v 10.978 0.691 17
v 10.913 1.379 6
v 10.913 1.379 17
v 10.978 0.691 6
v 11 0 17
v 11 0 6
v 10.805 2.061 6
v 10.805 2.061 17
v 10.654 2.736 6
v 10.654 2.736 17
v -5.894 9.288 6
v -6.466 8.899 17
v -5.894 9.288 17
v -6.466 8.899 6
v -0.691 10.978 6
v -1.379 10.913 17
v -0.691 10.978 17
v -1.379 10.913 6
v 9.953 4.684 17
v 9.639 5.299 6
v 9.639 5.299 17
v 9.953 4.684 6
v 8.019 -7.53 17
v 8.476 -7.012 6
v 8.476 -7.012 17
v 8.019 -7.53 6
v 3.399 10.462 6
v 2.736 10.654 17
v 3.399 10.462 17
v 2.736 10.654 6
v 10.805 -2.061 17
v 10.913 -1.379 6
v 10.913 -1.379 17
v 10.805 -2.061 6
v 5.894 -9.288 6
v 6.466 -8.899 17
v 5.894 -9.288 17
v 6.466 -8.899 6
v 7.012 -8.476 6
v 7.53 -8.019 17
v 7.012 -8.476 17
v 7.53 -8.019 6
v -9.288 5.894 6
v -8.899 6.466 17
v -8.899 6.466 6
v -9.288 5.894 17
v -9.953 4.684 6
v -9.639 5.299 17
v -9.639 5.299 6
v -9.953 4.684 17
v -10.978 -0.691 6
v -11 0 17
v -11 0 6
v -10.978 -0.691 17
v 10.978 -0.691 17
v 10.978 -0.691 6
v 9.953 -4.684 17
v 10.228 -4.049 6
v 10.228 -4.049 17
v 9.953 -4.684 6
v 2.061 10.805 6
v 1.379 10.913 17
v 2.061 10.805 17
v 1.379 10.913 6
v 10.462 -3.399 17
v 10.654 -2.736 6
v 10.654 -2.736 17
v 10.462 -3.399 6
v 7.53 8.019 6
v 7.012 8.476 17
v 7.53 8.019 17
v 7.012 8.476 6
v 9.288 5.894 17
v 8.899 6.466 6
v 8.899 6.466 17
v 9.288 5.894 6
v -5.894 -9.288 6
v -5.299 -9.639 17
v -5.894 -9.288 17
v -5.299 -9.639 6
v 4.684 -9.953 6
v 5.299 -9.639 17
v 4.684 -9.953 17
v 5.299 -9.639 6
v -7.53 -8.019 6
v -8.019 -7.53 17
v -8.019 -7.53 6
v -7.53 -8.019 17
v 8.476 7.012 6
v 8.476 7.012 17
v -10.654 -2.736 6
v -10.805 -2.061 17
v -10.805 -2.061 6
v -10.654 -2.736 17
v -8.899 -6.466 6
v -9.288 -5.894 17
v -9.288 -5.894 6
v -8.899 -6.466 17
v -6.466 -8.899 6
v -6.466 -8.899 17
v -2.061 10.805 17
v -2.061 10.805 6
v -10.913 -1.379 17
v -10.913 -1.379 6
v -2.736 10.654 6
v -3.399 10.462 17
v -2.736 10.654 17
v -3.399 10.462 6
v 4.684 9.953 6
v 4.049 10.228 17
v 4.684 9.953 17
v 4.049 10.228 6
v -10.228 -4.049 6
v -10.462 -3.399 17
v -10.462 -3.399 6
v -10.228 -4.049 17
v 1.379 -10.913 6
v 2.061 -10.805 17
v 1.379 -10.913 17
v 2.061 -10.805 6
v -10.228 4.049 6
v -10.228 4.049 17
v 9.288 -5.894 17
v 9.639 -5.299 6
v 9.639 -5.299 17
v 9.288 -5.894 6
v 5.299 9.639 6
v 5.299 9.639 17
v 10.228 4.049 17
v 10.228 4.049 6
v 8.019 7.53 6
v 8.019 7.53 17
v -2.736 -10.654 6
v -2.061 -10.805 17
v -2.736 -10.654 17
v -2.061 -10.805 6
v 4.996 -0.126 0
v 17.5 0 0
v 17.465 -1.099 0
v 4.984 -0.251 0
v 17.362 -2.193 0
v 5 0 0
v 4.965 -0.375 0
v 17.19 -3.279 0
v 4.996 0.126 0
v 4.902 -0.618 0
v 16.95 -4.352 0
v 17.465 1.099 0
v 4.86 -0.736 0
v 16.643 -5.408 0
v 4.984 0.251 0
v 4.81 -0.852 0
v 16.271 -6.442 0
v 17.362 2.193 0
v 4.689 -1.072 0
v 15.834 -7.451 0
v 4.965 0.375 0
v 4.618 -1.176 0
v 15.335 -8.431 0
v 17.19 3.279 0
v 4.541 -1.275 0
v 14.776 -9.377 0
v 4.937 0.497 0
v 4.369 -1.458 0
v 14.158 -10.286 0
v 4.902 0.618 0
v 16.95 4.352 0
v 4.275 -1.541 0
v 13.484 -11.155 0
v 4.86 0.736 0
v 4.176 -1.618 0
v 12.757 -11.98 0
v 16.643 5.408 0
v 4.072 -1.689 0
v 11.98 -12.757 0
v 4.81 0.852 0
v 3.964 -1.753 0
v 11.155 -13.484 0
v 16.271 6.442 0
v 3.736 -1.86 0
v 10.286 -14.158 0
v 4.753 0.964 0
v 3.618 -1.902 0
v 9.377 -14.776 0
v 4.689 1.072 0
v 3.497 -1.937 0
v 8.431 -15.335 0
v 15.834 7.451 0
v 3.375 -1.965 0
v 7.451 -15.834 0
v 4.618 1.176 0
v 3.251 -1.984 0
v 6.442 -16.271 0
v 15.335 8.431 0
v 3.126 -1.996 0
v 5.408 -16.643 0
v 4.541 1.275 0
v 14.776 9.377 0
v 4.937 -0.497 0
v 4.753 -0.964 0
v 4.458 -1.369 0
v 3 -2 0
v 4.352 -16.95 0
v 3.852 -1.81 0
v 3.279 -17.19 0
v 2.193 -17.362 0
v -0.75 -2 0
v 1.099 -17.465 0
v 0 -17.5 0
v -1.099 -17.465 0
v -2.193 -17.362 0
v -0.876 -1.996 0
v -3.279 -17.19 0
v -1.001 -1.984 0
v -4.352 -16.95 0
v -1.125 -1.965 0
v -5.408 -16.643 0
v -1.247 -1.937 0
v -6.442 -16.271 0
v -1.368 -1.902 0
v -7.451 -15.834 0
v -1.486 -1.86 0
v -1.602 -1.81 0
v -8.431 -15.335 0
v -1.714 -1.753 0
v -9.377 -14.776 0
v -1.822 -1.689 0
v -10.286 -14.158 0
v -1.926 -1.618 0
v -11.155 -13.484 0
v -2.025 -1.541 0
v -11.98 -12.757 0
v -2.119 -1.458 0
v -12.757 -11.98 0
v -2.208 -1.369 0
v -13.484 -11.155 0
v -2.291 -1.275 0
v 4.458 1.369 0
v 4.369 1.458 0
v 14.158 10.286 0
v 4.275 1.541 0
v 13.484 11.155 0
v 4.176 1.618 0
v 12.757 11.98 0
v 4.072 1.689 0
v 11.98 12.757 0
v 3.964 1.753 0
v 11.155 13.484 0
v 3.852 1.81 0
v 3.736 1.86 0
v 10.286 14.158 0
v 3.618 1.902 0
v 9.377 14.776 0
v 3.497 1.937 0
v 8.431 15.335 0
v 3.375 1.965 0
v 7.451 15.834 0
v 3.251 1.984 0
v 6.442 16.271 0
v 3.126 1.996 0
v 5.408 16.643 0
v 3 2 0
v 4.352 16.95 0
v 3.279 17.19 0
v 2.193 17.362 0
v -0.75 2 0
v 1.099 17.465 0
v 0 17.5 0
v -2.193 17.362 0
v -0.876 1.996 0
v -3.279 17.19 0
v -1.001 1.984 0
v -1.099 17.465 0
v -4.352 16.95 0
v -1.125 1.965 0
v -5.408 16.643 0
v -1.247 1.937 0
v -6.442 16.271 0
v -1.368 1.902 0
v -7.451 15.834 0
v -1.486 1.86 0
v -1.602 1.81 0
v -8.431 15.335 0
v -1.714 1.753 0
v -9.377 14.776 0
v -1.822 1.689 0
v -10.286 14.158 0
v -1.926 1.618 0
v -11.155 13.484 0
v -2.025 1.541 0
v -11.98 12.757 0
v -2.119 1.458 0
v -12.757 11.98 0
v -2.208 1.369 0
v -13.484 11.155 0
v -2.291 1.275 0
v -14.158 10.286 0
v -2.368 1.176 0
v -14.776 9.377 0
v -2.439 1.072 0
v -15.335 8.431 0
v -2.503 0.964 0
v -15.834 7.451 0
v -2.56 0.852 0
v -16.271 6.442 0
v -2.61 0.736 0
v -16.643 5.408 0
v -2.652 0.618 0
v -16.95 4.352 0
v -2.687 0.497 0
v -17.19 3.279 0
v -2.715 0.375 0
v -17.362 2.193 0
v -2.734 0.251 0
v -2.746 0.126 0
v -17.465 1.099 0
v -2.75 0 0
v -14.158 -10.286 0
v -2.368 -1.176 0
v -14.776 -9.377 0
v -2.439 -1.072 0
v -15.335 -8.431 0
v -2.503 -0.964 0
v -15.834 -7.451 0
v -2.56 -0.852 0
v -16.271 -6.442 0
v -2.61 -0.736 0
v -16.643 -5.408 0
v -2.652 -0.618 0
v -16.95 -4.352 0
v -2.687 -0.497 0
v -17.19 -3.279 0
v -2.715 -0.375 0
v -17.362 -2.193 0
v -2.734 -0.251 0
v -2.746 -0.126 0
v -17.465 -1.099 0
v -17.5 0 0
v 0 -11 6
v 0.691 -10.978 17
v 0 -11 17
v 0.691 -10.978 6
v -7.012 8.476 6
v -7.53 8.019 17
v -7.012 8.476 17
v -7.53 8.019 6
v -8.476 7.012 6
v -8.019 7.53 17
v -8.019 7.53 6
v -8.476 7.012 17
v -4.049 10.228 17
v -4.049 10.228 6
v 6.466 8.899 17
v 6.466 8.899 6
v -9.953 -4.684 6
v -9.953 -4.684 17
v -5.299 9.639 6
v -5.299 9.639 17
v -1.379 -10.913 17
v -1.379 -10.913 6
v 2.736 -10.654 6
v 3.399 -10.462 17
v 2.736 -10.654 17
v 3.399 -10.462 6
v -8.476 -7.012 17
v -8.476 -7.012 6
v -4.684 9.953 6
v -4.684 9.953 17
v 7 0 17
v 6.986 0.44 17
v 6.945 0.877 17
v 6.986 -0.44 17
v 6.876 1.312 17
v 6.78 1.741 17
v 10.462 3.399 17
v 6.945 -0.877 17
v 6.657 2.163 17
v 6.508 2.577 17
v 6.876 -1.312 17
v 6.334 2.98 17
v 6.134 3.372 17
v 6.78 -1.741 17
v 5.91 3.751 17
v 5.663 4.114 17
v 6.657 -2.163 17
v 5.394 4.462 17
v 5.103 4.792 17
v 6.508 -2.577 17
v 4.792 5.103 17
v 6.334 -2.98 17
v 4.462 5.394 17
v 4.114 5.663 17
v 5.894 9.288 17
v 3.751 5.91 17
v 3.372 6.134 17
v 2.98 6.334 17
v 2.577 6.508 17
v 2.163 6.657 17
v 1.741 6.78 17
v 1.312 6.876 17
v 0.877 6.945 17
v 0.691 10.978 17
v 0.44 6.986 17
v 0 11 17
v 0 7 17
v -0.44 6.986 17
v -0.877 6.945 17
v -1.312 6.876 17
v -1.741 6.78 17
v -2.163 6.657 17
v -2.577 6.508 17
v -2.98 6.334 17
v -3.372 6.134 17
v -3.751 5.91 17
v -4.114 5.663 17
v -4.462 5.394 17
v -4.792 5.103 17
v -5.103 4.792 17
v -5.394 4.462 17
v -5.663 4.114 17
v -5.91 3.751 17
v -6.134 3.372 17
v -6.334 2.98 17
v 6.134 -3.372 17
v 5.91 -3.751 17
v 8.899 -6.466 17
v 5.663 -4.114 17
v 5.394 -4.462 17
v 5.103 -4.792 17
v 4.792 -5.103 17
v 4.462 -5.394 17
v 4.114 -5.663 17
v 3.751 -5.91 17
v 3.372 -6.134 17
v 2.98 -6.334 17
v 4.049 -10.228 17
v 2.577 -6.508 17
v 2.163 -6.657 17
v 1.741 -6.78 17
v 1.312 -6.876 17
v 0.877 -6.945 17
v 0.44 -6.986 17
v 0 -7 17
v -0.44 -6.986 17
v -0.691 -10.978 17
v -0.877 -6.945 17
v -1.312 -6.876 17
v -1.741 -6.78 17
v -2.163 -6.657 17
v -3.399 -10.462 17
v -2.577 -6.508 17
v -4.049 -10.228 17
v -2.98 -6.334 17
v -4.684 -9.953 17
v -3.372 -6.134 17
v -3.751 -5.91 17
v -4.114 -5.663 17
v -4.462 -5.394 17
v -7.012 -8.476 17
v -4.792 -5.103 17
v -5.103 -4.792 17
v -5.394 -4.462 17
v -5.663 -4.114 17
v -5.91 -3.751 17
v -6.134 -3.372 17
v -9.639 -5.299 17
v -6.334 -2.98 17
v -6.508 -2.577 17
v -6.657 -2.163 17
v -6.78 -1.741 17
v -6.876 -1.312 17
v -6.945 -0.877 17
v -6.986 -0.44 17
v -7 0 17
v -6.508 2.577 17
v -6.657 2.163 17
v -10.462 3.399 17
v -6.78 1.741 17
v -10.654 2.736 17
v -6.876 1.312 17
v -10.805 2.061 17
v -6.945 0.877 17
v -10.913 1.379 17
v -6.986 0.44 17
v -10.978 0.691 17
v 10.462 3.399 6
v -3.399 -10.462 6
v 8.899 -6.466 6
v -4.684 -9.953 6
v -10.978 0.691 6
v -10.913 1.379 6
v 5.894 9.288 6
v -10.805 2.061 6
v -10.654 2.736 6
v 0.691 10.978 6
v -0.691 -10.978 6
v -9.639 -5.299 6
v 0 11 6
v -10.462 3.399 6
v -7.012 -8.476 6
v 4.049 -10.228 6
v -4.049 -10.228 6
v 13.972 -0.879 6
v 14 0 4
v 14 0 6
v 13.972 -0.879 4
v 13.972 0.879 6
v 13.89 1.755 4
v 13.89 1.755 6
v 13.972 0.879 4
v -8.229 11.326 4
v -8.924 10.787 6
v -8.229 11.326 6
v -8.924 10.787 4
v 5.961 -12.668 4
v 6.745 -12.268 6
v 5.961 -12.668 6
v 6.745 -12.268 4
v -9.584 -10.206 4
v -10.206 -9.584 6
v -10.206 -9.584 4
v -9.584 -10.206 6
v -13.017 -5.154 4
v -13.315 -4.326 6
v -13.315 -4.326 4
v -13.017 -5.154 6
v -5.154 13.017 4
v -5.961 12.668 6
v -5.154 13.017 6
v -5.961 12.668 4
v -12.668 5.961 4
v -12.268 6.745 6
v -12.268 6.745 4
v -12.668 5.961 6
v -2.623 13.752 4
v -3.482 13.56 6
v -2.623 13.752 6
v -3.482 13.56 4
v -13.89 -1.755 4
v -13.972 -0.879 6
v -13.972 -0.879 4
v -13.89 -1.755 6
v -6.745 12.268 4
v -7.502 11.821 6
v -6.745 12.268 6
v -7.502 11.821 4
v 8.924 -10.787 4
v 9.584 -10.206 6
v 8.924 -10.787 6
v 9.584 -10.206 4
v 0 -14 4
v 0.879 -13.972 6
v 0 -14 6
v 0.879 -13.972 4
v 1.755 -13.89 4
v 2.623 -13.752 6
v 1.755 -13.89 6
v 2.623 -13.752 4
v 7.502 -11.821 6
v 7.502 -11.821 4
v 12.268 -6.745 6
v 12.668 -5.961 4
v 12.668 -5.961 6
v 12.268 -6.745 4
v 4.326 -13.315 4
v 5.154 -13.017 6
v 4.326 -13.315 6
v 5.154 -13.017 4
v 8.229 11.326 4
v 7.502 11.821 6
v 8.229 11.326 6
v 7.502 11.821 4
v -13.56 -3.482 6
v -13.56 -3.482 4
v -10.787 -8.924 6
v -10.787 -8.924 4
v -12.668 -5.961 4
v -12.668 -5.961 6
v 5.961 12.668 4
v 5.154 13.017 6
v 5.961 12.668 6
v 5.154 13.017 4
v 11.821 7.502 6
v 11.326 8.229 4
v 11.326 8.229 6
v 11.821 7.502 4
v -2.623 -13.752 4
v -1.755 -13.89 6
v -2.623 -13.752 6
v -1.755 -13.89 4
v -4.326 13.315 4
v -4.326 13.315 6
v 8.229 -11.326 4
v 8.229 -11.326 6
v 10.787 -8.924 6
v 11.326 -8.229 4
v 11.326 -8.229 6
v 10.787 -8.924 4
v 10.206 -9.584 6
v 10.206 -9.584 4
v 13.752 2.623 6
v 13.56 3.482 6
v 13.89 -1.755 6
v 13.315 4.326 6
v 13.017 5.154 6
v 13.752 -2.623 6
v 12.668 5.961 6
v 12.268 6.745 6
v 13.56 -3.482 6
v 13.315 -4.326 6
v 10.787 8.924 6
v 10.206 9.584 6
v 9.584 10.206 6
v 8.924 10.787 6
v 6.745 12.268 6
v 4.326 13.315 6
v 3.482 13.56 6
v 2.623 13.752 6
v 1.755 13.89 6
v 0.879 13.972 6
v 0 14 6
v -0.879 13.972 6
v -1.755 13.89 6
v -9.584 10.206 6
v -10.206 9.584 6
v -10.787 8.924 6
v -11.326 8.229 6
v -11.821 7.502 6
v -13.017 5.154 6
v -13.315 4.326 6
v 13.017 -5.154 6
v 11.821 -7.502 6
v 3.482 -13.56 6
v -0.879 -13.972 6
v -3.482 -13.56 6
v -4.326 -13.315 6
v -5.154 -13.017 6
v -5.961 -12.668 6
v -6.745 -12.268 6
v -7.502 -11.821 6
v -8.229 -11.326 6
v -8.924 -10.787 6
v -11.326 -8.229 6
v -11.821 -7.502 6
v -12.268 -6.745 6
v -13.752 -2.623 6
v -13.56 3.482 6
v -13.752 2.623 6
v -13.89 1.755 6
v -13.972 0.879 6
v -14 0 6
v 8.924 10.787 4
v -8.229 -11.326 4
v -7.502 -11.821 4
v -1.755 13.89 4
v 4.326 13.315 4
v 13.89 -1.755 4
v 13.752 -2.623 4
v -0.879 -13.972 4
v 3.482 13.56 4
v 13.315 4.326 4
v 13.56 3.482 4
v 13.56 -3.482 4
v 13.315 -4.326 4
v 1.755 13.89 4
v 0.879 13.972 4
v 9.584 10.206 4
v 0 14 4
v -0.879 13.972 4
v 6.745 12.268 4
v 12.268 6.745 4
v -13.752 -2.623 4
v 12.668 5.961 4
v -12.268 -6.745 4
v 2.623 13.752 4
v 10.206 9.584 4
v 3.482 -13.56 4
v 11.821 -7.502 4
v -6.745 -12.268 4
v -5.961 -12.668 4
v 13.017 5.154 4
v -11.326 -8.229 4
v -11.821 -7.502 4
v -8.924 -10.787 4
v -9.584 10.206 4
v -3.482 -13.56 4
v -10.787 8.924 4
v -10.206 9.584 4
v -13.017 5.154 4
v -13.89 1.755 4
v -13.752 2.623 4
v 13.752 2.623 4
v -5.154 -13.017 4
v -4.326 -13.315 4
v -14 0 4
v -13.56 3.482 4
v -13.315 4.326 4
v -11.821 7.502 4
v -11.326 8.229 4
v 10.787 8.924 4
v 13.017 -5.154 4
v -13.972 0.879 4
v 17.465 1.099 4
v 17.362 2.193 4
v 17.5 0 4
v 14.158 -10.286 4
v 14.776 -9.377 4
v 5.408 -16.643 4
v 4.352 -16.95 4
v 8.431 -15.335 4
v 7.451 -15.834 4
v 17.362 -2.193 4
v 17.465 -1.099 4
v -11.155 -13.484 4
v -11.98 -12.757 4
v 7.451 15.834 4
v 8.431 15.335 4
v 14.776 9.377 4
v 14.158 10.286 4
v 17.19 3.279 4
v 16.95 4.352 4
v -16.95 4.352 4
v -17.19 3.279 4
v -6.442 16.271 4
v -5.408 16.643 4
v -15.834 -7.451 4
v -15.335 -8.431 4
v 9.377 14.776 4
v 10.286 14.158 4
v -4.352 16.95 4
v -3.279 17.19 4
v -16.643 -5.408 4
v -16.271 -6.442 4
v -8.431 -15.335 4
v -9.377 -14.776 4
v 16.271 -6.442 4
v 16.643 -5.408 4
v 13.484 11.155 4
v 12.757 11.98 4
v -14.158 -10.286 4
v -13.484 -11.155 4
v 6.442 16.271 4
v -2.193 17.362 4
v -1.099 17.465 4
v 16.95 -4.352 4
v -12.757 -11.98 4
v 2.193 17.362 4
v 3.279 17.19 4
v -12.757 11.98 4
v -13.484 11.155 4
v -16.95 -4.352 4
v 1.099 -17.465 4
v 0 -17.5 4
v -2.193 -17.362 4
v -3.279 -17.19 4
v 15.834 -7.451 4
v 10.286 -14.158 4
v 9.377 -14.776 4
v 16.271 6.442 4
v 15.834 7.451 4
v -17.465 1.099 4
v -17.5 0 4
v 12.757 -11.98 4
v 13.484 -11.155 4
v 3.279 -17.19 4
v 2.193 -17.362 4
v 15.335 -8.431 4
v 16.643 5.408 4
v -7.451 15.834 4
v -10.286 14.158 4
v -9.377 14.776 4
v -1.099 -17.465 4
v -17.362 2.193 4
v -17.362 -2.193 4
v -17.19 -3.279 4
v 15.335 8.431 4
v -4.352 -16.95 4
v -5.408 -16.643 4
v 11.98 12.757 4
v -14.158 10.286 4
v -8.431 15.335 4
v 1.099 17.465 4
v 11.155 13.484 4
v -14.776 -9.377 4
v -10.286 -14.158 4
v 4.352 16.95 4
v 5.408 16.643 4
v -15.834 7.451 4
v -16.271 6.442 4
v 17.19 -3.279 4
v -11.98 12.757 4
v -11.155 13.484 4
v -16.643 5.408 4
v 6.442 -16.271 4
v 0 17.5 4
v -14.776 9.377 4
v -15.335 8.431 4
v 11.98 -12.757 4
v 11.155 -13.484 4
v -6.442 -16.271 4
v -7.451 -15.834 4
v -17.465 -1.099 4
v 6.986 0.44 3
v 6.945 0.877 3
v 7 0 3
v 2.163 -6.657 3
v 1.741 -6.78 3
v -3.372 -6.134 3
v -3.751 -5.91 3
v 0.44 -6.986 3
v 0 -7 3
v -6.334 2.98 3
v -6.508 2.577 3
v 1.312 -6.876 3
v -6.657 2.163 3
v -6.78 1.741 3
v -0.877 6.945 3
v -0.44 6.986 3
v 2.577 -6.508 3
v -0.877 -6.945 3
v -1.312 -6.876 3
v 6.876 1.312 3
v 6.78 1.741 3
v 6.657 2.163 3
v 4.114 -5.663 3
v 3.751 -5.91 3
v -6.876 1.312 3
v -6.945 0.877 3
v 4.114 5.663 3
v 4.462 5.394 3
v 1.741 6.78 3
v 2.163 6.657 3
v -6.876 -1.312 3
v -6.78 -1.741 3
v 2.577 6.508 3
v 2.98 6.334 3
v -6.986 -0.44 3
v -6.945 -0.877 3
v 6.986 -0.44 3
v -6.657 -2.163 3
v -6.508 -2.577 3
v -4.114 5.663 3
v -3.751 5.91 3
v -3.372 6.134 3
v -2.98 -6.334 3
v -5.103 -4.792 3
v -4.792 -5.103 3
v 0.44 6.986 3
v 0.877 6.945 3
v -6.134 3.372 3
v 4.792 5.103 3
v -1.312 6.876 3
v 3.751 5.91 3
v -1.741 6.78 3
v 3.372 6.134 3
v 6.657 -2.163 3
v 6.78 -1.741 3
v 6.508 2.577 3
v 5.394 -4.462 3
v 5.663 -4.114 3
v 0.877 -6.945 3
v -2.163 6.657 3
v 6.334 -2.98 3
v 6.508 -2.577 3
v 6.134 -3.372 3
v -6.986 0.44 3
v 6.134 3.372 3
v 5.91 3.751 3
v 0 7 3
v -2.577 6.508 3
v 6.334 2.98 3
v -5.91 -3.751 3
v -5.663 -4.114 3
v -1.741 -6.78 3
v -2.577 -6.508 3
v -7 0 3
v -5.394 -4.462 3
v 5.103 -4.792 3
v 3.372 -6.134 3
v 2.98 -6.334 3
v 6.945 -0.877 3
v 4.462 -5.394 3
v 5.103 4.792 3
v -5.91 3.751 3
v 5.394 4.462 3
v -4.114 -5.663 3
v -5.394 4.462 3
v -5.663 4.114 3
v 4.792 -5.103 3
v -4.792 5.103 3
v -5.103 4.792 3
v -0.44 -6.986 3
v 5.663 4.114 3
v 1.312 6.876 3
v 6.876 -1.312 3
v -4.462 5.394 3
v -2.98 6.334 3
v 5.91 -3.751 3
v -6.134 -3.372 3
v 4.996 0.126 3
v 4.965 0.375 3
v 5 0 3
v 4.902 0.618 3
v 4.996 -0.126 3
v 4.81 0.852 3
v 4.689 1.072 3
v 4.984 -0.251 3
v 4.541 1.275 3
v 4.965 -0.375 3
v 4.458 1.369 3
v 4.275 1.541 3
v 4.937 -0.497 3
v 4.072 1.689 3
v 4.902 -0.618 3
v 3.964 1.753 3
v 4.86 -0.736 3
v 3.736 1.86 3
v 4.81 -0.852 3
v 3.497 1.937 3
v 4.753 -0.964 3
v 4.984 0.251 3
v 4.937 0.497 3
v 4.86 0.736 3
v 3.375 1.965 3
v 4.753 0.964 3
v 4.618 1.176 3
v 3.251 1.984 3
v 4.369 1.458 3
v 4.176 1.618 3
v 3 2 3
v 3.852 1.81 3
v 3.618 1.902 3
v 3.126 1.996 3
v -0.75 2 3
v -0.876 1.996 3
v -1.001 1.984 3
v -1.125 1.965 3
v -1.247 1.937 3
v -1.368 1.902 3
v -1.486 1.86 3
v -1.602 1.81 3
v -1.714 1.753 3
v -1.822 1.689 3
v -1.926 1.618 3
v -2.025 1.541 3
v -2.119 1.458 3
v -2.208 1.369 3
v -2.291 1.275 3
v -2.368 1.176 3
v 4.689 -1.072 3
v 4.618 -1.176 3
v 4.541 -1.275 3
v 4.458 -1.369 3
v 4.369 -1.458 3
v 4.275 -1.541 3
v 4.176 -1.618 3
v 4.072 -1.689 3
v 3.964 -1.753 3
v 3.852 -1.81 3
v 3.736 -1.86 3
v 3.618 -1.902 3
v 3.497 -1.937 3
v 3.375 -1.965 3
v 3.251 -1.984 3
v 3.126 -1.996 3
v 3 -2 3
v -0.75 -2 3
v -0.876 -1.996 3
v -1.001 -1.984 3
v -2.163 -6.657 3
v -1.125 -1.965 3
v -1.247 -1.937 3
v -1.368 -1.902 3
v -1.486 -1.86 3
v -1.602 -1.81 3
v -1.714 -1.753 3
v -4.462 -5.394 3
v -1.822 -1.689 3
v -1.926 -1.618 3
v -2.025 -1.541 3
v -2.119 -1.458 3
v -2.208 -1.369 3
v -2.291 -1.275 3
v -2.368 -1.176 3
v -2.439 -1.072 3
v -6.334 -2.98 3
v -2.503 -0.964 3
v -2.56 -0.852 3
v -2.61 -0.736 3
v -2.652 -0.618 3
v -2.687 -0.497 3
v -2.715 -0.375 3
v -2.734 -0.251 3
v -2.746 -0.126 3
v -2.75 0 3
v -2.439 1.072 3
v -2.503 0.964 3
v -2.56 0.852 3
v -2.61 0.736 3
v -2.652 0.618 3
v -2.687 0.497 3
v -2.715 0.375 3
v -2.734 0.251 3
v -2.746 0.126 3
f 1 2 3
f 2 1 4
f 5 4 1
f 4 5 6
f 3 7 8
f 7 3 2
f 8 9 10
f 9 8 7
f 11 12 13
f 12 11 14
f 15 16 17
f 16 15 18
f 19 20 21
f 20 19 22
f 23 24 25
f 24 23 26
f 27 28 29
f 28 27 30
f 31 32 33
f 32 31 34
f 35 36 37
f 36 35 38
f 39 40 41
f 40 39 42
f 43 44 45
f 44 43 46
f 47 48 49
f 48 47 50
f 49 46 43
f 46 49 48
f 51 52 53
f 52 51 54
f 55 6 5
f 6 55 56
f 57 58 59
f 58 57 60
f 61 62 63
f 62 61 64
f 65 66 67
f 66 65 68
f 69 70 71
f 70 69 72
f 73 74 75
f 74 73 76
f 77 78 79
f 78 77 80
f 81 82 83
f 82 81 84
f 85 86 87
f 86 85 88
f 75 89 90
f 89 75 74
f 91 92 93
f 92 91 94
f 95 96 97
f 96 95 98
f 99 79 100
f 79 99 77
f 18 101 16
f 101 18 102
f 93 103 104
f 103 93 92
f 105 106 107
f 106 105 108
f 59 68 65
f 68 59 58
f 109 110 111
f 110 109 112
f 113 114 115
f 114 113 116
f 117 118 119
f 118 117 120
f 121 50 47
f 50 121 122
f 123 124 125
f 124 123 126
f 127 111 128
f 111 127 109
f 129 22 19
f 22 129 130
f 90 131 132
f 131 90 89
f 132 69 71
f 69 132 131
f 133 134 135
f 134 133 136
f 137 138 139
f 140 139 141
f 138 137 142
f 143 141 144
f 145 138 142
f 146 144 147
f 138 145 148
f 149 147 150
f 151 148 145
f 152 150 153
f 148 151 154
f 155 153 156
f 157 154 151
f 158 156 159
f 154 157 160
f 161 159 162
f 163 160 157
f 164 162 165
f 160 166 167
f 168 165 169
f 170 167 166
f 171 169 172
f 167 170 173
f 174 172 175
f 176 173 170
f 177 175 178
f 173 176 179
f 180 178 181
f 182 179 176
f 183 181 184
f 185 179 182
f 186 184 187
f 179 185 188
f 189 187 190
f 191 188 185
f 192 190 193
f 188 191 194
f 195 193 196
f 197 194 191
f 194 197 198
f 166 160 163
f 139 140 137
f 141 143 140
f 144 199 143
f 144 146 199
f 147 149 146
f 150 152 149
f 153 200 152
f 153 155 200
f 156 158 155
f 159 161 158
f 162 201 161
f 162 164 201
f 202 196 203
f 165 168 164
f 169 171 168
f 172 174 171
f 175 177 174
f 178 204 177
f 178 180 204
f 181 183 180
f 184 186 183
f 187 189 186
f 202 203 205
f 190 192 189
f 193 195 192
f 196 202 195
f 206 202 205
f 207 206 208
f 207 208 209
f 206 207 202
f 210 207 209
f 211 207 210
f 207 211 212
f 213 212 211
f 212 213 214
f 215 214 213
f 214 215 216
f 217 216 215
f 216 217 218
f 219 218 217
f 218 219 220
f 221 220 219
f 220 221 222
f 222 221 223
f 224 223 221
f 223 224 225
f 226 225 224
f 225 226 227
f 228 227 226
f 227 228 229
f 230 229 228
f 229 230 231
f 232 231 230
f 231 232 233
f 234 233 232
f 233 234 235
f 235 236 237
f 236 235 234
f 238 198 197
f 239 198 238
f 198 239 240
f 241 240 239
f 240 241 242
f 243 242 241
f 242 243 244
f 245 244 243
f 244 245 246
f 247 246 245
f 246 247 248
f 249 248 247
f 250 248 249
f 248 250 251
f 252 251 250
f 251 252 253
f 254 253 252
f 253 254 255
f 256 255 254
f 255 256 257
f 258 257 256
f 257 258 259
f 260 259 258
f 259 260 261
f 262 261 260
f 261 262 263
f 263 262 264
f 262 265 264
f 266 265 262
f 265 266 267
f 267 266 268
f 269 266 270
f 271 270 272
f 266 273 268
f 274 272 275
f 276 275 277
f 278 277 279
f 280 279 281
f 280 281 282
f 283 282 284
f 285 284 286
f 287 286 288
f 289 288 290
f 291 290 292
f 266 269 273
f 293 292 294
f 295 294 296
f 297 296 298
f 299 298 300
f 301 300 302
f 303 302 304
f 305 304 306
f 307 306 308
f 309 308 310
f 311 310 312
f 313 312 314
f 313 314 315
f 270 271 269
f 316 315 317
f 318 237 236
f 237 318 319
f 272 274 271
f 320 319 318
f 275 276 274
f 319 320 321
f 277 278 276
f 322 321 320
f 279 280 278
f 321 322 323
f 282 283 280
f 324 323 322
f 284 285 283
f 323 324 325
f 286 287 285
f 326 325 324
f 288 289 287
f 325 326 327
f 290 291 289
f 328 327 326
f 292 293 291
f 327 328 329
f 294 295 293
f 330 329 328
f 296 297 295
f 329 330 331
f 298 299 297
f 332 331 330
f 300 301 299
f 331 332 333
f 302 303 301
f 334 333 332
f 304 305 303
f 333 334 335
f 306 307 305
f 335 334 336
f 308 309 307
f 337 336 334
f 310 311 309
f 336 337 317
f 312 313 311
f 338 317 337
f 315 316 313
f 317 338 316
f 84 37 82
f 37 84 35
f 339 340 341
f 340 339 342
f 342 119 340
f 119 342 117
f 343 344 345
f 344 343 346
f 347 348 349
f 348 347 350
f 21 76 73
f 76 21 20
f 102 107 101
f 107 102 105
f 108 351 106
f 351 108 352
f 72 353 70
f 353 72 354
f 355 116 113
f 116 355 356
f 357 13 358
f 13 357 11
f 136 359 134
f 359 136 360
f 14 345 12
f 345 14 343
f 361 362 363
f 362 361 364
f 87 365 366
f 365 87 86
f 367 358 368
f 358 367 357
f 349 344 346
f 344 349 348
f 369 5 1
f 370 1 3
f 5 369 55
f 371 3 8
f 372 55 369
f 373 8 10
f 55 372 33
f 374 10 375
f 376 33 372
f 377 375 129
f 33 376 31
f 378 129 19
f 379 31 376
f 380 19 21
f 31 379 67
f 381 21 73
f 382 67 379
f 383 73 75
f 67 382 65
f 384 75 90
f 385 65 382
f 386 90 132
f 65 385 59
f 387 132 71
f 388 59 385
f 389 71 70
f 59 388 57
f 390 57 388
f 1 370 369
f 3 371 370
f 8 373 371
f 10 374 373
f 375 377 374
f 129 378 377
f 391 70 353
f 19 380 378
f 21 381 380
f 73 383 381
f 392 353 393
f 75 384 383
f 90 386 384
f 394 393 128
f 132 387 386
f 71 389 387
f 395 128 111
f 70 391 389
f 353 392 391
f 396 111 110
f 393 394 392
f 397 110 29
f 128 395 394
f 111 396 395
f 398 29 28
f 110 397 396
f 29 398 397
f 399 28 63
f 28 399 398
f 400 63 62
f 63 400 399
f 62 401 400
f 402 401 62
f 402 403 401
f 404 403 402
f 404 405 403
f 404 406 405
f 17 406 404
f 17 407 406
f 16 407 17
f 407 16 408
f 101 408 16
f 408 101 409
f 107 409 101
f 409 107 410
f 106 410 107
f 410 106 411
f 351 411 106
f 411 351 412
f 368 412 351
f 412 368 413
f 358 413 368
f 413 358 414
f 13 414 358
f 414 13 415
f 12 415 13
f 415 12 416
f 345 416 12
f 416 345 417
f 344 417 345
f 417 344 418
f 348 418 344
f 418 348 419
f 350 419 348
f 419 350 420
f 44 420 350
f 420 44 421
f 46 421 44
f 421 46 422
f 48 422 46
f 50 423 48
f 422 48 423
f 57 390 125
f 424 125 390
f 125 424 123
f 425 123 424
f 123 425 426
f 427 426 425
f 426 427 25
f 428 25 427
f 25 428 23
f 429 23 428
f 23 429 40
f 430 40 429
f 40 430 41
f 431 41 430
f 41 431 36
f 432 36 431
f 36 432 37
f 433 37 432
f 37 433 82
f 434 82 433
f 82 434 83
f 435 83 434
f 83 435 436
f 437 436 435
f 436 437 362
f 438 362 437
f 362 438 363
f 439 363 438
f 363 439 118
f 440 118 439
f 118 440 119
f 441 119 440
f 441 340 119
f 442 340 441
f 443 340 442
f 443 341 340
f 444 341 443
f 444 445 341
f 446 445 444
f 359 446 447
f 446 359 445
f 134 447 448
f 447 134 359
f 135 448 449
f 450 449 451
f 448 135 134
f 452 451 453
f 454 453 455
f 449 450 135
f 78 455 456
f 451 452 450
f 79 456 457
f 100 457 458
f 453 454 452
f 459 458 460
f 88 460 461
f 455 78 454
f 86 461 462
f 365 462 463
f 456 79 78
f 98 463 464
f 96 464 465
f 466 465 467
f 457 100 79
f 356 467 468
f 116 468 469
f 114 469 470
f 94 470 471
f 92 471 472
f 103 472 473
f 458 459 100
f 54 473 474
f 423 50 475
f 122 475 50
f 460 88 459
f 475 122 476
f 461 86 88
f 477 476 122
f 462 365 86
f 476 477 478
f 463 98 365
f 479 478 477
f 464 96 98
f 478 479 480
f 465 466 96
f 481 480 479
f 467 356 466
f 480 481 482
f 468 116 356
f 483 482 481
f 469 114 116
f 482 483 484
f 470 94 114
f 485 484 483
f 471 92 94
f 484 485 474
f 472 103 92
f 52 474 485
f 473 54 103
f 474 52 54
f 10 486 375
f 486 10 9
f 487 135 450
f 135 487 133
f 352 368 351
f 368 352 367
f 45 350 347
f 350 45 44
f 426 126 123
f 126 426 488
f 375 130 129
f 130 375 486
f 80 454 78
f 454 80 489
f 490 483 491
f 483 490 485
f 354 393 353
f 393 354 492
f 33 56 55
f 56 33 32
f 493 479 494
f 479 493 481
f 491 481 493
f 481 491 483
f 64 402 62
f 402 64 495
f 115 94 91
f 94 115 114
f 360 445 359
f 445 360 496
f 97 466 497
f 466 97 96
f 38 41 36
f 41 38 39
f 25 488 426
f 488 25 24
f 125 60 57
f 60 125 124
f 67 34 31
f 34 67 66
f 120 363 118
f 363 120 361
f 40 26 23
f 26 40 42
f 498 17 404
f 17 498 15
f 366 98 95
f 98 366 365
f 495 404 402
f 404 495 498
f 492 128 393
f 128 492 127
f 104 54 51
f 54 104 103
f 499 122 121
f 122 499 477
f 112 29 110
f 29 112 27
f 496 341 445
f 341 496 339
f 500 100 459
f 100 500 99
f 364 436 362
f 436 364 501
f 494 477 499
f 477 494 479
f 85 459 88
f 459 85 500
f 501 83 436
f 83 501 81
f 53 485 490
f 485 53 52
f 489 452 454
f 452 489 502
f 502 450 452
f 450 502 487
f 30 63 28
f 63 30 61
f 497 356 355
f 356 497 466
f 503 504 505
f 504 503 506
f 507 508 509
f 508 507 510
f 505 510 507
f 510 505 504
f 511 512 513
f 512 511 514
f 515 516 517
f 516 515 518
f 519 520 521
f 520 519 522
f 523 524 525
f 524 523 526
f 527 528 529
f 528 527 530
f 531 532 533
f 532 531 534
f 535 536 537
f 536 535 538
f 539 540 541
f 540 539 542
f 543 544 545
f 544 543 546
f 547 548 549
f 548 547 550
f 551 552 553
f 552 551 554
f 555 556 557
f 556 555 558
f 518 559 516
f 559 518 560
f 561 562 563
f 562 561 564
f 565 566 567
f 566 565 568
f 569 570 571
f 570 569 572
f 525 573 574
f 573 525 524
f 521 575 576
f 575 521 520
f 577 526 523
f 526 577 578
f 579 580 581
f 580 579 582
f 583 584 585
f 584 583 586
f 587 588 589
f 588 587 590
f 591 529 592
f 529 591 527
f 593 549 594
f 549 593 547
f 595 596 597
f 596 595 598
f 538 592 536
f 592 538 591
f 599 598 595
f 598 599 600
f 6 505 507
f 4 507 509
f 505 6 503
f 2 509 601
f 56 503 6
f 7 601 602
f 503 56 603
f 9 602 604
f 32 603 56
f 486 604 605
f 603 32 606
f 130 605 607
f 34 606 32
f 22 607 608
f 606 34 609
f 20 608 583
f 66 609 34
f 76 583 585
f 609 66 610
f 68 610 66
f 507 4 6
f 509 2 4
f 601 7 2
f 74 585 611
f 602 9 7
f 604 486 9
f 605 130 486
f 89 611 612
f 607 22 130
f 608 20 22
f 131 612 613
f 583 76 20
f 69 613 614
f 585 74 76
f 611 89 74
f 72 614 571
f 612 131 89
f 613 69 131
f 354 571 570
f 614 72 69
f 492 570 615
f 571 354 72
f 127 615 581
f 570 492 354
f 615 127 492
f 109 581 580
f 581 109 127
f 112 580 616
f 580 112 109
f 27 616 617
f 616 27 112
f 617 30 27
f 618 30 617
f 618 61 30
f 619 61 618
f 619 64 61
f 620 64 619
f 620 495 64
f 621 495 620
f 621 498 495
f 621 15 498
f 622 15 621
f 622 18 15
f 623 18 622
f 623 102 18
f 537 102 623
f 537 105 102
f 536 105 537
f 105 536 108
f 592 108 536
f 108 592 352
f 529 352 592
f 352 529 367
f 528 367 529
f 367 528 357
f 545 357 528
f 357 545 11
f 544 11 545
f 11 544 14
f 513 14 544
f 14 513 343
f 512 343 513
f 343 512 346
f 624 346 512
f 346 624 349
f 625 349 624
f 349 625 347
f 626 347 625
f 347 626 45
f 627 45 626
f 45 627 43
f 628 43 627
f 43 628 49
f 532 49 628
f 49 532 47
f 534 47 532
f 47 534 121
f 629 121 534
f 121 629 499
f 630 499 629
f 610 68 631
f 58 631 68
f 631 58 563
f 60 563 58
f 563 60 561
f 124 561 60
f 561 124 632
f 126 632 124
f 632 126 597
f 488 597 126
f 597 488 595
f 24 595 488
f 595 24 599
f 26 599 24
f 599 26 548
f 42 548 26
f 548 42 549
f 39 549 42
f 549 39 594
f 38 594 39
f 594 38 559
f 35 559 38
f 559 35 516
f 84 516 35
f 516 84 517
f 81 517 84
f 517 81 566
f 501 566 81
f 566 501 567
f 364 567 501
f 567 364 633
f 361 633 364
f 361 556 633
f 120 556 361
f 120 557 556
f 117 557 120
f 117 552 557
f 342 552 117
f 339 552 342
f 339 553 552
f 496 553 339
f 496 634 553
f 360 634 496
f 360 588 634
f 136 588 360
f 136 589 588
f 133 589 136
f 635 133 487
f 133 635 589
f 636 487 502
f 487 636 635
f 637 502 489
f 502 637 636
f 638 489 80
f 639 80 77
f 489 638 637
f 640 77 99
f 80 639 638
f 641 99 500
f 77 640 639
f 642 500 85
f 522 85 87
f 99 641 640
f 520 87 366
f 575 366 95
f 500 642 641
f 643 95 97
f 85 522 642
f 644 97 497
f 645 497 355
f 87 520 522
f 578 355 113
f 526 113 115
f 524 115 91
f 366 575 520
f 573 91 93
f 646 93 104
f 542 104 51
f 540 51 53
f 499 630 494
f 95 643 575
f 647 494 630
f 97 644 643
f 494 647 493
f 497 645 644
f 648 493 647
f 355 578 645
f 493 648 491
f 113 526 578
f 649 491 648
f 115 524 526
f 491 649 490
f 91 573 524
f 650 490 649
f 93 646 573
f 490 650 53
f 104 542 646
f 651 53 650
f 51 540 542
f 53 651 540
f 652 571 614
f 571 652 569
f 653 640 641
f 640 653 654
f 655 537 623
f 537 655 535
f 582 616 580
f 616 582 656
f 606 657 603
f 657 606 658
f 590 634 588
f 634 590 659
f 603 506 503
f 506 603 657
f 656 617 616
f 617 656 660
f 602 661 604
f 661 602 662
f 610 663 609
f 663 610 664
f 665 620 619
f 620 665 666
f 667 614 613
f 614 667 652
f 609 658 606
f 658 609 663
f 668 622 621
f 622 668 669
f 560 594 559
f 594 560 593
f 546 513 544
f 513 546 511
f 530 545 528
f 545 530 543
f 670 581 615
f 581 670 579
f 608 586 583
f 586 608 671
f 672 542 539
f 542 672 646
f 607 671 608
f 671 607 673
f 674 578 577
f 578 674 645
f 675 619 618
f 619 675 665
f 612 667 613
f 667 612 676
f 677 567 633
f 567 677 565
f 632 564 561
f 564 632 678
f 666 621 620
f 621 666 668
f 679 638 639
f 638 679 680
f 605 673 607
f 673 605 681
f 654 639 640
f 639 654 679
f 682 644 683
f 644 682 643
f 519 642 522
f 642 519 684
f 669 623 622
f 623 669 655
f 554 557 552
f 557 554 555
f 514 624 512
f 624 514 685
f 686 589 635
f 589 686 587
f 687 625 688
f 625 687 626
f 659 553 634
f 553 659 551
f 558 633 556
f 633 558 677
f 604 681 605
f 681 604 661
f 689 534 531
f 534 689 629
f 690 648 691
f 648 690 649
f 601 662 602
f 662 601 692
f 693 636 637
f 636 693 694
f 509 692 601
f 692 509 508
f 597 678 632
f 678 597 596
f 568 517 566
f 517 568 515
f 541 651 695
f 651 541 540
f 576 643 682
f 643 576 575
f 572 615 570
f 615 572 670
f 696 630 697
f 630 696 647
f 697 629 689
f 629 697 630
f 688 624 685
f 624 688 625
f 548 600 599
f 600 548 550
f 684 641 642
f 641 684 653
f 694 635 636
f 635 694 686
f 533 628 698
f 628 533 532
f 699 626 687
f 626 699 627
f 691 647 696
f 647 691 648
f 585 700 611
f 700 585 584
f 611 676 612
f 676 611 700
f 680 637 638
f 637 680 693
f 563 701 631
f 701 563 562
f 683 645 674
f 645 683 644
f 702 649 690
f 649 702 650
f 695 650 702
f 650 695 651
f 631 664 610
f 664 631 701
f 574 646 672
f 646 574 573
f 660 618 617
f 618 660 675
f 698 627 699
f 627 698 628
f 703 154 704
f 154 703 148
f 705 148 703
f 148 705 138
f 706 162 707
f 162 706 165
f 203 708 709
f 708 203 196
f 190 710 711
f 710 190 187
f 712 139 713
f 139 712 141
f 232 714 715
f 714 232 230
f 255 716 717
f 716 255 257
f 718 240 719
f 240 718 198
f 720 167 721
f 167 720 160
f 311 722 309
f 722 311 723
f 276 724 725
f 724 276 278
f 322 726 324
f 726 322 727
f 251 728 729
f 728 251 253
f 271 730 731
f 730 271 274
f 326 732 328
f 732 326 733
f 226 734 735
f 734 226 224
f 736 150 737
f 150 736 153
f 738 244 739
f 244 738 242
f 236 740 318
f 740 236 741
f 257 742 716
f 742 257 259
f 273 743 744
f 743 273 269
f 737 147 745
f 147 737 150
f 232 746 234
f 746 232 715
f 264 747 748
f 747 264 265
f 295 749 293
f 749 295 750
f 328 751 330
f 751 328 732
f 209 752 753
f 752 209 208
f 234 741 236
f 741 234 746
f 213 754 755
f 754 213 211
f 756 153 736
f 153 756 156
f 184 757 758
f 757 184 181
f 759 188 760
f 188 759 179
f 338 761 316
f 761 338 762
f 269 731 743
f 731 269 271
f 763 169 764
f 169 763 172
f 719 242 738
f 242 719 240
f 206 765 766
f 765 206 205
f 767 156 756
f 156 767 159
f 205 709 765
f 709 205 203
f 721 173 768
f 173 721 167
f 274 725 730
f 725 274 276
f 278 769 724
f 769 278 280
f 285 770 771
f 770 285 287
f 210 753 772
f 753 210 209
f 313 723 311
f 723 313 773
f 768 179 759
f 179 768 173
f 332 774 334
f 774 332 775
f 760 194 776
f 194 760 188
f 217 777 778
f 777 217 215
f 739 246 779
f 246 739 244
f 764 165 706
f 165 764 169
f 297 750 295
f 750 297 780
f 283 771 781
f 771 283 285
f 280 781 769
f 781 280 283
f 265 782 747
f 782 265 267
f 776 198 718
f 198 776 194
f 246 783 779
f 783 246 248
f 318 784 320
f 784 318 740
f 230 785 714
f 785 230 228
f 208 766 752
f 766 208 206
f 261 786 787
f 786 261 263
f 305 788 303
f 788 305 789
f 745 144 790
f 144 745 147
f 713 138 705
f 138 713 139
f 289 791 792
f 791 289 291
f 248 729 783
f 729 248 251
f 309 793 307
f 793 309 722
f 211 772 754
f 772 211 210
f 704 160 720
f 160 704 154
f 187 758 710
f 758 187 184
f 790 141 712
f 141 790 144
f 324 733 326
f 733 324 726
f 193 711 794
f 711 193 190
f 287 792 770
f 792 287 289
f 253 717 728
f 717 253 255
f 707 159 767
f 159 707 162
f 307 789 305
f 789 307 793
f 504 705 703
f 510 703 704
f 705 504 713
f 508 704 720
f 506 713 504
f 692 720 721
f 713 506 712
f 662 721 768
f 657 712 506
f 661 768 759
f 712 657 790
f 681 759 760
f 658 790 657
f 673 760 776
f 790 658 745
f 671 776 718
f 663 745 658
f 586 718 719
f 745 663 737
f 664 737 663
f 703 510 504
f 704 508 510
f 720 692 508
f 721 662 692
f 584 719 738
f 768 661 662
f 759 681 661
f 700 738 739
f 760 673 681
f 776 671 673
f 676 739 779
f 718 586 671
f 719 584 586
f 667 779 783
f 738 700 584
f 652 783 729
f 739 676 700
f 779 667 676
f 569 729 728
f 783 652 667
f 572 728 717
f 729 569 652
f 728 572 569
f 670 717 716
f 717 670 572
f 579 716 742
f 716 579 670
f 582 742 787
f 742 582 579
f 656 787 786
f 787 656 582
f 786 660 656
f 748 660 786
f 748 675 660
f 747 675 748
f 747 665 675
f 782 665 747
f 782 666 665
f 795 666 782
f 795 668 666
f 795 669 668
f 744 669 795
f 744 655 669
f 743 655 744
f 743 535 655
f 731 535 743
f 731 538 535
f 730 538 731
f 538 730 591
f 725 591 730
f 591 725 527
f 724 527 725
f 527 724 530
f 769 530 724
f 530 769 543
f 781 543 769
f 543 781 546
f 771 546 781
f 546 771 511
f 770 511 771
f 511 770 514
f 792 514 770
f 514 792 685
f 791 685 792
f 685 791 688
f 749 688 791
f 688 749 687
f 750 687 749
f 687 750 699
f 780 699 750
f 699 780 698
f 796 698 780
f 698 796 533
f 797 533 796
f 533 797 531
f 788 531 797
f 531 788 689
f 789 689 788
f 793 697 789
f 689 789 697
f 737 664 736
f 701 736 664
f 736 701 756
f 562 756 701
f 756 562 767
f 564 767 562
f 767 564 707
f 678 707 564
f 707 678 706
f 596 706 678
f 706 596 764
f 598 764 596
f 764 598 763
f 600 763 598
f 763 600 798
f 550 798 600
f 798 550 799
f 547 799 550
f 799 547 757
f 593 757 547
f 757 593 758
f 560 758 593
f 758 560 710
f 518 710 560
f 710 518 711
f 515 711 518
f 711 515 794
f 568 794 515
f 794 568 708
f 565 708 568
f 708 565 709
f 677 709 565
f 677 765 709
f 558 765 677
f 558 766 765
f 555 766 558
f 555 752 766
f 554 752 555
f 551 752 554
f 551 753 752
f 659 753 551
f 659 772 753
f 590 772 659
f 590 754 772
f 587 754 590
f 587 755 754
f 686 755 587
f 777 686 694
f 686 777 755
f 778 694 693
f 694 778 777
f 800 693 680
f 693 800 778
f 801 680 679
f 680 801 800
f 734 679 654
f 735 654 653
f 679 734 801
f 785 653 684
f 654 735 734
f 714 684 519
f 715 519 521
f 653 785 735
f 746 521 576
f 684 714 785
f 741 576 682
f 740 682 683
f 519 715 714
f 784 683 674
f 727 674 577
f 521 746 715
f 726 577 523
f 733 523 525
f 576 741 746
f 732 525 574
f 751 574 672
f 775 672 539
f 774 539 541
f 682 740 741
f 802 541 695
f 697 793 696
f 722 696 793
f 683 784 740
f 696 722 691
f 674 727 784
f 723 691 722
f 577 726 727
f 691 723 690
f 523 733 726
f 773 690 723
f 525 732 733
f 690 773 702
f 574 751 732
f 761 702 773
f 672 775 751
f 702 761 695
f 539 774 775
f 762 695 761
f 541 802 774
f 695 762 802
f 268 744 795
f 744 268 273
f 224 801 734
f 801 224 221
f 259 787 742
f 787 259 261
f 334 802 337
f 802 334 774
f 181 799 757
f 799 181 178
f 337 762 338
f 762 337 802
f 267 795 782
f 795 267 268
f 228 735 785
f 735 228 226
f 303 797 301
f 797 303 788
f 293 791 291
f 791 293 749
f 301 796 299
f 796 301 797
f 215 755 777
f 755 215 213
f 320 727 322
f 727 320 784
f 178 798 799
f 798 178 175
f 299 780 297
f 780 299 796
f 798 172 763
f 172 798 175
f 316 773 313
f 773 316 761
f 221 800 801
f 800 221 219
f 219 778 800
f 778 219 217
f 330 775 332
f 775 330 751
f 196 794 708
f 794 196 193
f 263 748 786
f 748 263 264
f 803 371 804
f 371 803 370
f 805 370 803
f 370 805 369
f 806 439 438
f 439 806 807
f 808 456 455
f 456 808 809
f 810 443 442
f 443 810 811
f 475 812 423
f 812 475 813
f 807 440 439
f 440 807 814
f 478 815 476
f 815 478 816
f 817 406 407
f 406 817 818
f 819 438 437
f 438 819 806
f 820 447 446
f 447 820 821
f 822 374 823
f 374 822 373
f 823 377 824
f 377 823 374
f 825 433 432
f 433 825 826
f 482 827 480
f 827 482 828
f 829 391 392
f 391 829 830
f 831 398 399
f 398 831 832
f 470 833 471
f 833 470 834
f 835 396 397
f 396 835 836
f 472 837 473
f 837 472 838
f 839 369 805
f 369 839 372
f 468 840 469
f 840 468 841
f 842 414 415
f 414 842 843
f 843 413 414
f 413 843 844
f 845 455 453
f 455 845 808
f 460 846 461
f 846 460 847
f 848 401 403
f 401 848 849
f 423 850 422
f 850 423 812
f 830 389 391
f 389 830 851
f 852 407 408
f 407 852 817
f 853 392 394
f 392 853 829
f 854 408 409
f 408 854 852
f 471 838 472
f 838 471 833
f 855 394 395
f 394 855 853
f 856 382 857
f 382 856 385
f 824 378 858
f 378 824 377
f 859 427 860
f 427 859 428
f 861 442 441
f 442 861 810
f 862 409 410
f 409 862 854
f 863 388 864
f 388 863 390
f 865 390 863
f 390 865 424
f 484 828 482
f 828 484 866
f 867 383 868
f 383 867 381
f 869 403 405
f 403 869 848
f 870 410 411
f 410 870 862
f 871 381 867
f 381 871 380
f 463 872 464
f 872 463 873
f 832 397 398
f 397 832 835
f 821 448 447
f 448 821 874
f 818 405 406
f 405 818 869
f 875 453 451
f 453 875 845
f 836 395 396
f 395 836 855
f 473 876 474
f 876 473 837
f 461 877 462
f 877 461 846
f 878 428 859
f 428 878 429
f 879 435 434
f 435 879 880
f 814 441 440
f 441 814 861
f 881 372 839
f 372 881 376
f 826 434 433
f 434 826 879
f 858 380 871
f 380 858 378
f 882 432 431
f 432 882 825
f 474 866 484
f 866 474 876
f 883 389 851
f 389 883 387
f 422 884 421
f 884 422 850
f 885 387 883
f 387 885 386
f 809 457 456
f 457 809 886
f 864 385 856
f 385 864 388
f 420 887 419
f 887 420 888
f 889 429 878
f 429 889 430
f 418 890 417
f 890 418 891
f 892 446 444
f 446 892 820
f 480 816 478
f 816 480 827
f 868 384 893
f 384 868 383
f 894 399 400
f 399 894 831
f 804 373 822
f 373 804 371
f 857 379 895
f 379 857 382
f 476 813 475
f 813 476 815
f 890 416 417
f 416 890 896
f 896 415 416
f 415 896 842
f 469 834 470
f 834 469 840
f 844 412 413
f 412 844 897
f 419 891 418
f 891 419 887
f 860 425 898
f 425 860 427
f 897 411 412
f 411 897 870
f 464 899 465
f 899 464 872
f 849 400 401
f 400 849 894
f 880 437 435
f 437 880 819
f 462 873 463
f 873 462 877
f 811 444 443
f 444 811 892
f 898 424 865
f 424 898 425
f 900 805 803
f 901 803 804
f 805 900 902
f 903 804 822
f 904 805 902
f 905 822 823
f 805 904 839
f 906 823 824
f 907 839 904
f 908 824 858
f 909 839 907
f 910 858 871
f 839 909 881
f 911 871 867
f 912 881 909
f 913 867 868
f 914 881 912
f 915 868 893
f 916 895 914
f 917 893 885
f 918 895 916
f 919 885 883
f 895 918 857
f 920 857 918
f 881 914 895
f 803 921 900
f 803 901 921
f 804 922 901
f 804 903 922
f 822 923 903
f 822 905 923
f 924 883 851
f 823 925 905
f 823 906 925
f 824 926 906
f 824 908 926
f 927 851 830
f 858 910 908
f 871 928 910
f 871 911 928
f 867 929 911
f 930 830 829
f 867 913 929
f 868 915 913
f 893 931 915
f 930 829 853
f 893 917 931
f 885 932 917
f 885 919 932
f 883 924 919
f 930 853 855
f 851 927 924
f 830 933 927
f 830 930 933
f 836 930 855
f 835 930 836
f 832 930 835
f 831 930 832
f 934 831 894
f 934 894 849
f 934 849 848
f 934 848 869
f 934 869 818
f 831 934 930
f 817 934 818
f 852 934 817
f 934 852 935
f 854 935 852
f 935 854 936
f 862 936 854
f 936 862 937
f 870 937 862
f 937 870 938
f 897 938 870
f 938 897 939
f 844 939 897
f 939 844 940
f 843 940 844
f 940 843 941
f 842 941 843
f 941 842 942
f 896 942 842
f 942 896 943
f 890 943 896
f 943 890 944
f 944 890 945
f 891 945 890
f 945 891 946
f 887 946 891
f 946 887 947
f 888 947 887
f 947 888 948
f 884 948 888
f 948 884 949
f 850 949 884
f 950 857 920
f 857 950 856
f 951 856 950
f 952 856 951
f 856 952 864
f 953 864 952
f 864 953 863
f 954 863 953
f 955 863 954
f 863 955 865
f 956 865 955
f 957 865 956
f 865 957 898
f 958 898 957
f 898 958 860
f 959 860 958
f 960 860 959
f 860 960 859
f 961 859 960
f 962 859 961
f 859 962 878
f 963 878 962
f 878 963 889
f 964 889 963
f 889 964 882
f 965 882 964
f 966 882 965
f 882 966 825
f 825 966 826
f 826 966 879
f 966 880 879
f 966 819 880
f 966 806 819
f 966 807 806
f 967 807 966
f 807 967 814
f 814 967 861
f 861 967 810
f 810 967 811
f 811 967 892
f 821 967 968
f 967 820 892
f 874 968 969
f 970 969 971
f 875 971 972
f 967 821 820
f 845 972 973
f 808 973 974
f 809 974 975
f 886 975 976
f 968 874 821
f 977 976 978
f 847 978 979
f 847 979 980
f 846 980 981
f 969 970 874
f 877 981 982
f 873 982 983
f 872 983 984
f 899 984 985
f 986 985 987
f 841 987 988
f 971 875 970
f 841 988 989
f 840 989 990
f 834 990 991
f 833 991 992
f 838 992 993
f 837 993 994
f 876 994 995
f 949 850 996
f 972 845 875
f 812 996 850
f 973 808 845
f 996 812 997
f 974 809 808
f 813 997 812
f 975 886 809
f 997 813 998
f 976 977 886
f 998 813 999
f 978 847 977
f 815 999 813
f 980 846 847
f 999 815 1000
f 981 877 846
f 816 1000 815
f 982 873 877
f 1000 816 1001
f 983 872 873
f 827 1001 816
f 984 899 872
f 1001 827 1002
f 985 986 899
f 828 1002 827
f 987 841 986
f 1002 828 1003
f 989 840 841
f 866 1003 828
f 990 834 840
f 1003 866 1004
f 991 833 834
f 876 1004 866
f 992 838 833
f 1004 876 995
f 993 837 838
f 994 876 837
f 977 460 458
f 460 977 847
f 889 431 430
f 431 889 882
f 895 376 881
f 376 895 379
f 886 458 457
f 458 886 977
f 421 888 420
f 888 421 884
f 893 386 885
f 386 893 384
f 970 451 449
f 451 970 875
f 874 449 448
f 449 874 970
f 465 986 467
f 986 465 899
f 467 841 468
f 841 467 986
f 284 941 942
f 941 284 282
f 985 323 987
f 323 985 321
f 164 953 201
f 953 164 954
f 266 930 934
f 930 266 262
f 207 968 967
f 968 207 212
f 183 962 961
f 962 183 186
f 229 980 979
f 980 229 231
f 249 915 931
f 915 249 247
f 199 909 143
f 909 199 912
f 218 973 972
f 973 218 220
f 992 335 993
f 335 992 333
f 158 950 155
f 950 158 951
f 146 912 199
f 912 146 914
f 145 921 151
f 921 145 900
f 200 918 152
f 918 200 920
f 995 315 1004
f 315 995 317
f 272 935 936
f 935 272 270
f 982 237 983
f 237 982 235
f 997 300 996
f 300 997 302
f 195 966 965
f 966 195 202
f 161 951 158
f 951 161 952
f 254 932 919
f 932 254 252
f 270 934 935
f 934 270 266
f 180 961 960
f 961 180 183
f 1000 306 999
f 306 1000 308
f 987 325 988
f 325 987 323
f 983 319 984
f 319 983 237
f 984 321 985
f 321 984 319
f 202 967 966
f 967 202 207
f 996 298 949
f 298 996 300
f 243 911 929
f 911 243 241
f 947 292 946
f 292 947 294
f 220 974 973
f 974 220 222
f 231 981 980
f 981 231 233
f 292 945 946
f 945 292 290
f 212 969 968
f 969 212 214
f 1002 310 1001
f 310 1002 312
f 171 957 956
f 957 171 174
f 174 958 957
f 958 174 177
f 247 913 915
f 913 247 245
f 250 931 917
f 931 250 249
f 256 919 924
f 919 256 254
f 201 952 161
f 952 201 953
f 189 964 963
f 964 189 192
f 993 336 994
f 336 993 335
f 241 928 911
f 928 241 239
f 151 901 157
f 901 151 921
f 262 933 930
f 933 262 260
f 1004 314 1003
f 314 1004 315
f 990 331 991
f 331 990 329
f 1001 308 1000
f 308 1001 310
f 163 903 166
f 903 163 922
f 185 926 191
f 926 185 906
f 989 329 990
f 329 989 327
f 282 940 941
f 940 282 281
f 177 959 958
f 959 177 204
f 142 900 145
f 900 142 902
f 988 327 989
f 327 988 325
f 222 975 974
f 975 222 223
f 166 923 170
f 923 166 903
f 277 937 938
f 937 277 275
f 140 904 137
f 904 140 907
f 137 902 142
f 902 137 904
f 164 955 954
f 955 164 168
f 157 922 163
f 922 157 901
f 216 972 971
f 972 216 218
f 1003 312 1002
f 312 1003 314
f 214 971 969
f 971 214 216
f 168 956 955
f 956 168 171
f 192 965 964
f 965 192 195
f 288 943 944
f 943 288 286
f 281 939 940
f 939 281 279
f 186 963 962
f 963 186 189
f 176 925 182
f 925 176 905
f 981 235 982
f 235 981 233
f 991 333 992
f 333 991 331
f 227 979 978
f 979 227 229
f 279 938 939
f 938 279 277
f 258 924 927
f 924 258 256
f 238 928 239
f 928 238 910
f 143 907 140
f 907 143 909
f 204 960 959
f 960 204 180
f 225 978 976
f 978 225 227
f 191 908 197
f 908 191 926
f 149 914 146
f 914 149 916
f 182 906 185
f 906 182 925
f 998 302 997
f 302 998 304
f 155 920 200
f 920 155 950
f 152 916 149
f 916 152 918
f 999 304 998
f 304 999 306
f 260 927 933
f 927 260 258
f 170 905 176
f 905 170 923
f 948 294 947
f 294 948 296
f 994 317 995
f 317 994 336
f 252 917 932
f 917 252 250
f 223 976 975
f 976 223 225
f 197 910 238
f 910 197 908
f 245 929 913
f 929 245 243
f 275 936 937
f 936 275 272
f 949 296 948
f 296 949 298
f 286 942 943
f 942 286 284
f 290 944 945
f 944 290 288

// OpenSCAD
$fn=100;

// these are the dimensions of the thing, not the shape

MID_D = 28; // the middle dieameter measurement of the leg
IN_D = 22; // The diameter of what goes inside
OUTER_D = 35; // the diameter of the foot
HOLE_D = 14; // the hole where the screw head and the iron has to fit
SCREW_D = 4; // how wide is the screw (hole)
WHIGGLE = 3; // extra space if you miss when drilling a hole in the ground

IN_HEIGHT = 11; // How long is the thing that goes into the leg
STEP_HEIGHT = 2;
FOOT_HEIGHT = 4;
SCREW_BASE_THICKNESS = 3;

// derived constants for easier living
TOT_HEIGHT = IN_HEIGHT + STEP_HEIGHT + FOOT_HEIGHT;

// the modules help with defining the shape

module OuterShell() {
    cylinder(h = TOT_HEIGHT, r = IN_D / 2, center = false);
    cylinder(h = FOOT_HEIGHT + STEP_HEIGHT, r = MID_D / 2, center = false);
    cylinder(h = FOOT_HEIGHT, r = OUTER_D / 2, center = false);
}

module HoleForScrews() {
    hull() {
        translate([-WHIGGLE / 4,0,0])
        cylinder(h = SCREW_BASE_THICKNESS * 3, r = SCREW_D / 2, center = true);
        translate([WHIGGLE,0,0])
            cylinder(h = SCREW_BASE_THICKNESS * 3, r = SCREW_D / 2, center = true);
    }
}

module HoledOuterShell() {
    difference() {
        OuterShell();
        translate([0,0,SCREW_BASE_THICKNESS]) {
            cylinder(h = TOT_HEIGHT, r = HOLE_D / 2, center = false);
        }
        HoleForScrews();
    }
}

HoledOuterShell();
